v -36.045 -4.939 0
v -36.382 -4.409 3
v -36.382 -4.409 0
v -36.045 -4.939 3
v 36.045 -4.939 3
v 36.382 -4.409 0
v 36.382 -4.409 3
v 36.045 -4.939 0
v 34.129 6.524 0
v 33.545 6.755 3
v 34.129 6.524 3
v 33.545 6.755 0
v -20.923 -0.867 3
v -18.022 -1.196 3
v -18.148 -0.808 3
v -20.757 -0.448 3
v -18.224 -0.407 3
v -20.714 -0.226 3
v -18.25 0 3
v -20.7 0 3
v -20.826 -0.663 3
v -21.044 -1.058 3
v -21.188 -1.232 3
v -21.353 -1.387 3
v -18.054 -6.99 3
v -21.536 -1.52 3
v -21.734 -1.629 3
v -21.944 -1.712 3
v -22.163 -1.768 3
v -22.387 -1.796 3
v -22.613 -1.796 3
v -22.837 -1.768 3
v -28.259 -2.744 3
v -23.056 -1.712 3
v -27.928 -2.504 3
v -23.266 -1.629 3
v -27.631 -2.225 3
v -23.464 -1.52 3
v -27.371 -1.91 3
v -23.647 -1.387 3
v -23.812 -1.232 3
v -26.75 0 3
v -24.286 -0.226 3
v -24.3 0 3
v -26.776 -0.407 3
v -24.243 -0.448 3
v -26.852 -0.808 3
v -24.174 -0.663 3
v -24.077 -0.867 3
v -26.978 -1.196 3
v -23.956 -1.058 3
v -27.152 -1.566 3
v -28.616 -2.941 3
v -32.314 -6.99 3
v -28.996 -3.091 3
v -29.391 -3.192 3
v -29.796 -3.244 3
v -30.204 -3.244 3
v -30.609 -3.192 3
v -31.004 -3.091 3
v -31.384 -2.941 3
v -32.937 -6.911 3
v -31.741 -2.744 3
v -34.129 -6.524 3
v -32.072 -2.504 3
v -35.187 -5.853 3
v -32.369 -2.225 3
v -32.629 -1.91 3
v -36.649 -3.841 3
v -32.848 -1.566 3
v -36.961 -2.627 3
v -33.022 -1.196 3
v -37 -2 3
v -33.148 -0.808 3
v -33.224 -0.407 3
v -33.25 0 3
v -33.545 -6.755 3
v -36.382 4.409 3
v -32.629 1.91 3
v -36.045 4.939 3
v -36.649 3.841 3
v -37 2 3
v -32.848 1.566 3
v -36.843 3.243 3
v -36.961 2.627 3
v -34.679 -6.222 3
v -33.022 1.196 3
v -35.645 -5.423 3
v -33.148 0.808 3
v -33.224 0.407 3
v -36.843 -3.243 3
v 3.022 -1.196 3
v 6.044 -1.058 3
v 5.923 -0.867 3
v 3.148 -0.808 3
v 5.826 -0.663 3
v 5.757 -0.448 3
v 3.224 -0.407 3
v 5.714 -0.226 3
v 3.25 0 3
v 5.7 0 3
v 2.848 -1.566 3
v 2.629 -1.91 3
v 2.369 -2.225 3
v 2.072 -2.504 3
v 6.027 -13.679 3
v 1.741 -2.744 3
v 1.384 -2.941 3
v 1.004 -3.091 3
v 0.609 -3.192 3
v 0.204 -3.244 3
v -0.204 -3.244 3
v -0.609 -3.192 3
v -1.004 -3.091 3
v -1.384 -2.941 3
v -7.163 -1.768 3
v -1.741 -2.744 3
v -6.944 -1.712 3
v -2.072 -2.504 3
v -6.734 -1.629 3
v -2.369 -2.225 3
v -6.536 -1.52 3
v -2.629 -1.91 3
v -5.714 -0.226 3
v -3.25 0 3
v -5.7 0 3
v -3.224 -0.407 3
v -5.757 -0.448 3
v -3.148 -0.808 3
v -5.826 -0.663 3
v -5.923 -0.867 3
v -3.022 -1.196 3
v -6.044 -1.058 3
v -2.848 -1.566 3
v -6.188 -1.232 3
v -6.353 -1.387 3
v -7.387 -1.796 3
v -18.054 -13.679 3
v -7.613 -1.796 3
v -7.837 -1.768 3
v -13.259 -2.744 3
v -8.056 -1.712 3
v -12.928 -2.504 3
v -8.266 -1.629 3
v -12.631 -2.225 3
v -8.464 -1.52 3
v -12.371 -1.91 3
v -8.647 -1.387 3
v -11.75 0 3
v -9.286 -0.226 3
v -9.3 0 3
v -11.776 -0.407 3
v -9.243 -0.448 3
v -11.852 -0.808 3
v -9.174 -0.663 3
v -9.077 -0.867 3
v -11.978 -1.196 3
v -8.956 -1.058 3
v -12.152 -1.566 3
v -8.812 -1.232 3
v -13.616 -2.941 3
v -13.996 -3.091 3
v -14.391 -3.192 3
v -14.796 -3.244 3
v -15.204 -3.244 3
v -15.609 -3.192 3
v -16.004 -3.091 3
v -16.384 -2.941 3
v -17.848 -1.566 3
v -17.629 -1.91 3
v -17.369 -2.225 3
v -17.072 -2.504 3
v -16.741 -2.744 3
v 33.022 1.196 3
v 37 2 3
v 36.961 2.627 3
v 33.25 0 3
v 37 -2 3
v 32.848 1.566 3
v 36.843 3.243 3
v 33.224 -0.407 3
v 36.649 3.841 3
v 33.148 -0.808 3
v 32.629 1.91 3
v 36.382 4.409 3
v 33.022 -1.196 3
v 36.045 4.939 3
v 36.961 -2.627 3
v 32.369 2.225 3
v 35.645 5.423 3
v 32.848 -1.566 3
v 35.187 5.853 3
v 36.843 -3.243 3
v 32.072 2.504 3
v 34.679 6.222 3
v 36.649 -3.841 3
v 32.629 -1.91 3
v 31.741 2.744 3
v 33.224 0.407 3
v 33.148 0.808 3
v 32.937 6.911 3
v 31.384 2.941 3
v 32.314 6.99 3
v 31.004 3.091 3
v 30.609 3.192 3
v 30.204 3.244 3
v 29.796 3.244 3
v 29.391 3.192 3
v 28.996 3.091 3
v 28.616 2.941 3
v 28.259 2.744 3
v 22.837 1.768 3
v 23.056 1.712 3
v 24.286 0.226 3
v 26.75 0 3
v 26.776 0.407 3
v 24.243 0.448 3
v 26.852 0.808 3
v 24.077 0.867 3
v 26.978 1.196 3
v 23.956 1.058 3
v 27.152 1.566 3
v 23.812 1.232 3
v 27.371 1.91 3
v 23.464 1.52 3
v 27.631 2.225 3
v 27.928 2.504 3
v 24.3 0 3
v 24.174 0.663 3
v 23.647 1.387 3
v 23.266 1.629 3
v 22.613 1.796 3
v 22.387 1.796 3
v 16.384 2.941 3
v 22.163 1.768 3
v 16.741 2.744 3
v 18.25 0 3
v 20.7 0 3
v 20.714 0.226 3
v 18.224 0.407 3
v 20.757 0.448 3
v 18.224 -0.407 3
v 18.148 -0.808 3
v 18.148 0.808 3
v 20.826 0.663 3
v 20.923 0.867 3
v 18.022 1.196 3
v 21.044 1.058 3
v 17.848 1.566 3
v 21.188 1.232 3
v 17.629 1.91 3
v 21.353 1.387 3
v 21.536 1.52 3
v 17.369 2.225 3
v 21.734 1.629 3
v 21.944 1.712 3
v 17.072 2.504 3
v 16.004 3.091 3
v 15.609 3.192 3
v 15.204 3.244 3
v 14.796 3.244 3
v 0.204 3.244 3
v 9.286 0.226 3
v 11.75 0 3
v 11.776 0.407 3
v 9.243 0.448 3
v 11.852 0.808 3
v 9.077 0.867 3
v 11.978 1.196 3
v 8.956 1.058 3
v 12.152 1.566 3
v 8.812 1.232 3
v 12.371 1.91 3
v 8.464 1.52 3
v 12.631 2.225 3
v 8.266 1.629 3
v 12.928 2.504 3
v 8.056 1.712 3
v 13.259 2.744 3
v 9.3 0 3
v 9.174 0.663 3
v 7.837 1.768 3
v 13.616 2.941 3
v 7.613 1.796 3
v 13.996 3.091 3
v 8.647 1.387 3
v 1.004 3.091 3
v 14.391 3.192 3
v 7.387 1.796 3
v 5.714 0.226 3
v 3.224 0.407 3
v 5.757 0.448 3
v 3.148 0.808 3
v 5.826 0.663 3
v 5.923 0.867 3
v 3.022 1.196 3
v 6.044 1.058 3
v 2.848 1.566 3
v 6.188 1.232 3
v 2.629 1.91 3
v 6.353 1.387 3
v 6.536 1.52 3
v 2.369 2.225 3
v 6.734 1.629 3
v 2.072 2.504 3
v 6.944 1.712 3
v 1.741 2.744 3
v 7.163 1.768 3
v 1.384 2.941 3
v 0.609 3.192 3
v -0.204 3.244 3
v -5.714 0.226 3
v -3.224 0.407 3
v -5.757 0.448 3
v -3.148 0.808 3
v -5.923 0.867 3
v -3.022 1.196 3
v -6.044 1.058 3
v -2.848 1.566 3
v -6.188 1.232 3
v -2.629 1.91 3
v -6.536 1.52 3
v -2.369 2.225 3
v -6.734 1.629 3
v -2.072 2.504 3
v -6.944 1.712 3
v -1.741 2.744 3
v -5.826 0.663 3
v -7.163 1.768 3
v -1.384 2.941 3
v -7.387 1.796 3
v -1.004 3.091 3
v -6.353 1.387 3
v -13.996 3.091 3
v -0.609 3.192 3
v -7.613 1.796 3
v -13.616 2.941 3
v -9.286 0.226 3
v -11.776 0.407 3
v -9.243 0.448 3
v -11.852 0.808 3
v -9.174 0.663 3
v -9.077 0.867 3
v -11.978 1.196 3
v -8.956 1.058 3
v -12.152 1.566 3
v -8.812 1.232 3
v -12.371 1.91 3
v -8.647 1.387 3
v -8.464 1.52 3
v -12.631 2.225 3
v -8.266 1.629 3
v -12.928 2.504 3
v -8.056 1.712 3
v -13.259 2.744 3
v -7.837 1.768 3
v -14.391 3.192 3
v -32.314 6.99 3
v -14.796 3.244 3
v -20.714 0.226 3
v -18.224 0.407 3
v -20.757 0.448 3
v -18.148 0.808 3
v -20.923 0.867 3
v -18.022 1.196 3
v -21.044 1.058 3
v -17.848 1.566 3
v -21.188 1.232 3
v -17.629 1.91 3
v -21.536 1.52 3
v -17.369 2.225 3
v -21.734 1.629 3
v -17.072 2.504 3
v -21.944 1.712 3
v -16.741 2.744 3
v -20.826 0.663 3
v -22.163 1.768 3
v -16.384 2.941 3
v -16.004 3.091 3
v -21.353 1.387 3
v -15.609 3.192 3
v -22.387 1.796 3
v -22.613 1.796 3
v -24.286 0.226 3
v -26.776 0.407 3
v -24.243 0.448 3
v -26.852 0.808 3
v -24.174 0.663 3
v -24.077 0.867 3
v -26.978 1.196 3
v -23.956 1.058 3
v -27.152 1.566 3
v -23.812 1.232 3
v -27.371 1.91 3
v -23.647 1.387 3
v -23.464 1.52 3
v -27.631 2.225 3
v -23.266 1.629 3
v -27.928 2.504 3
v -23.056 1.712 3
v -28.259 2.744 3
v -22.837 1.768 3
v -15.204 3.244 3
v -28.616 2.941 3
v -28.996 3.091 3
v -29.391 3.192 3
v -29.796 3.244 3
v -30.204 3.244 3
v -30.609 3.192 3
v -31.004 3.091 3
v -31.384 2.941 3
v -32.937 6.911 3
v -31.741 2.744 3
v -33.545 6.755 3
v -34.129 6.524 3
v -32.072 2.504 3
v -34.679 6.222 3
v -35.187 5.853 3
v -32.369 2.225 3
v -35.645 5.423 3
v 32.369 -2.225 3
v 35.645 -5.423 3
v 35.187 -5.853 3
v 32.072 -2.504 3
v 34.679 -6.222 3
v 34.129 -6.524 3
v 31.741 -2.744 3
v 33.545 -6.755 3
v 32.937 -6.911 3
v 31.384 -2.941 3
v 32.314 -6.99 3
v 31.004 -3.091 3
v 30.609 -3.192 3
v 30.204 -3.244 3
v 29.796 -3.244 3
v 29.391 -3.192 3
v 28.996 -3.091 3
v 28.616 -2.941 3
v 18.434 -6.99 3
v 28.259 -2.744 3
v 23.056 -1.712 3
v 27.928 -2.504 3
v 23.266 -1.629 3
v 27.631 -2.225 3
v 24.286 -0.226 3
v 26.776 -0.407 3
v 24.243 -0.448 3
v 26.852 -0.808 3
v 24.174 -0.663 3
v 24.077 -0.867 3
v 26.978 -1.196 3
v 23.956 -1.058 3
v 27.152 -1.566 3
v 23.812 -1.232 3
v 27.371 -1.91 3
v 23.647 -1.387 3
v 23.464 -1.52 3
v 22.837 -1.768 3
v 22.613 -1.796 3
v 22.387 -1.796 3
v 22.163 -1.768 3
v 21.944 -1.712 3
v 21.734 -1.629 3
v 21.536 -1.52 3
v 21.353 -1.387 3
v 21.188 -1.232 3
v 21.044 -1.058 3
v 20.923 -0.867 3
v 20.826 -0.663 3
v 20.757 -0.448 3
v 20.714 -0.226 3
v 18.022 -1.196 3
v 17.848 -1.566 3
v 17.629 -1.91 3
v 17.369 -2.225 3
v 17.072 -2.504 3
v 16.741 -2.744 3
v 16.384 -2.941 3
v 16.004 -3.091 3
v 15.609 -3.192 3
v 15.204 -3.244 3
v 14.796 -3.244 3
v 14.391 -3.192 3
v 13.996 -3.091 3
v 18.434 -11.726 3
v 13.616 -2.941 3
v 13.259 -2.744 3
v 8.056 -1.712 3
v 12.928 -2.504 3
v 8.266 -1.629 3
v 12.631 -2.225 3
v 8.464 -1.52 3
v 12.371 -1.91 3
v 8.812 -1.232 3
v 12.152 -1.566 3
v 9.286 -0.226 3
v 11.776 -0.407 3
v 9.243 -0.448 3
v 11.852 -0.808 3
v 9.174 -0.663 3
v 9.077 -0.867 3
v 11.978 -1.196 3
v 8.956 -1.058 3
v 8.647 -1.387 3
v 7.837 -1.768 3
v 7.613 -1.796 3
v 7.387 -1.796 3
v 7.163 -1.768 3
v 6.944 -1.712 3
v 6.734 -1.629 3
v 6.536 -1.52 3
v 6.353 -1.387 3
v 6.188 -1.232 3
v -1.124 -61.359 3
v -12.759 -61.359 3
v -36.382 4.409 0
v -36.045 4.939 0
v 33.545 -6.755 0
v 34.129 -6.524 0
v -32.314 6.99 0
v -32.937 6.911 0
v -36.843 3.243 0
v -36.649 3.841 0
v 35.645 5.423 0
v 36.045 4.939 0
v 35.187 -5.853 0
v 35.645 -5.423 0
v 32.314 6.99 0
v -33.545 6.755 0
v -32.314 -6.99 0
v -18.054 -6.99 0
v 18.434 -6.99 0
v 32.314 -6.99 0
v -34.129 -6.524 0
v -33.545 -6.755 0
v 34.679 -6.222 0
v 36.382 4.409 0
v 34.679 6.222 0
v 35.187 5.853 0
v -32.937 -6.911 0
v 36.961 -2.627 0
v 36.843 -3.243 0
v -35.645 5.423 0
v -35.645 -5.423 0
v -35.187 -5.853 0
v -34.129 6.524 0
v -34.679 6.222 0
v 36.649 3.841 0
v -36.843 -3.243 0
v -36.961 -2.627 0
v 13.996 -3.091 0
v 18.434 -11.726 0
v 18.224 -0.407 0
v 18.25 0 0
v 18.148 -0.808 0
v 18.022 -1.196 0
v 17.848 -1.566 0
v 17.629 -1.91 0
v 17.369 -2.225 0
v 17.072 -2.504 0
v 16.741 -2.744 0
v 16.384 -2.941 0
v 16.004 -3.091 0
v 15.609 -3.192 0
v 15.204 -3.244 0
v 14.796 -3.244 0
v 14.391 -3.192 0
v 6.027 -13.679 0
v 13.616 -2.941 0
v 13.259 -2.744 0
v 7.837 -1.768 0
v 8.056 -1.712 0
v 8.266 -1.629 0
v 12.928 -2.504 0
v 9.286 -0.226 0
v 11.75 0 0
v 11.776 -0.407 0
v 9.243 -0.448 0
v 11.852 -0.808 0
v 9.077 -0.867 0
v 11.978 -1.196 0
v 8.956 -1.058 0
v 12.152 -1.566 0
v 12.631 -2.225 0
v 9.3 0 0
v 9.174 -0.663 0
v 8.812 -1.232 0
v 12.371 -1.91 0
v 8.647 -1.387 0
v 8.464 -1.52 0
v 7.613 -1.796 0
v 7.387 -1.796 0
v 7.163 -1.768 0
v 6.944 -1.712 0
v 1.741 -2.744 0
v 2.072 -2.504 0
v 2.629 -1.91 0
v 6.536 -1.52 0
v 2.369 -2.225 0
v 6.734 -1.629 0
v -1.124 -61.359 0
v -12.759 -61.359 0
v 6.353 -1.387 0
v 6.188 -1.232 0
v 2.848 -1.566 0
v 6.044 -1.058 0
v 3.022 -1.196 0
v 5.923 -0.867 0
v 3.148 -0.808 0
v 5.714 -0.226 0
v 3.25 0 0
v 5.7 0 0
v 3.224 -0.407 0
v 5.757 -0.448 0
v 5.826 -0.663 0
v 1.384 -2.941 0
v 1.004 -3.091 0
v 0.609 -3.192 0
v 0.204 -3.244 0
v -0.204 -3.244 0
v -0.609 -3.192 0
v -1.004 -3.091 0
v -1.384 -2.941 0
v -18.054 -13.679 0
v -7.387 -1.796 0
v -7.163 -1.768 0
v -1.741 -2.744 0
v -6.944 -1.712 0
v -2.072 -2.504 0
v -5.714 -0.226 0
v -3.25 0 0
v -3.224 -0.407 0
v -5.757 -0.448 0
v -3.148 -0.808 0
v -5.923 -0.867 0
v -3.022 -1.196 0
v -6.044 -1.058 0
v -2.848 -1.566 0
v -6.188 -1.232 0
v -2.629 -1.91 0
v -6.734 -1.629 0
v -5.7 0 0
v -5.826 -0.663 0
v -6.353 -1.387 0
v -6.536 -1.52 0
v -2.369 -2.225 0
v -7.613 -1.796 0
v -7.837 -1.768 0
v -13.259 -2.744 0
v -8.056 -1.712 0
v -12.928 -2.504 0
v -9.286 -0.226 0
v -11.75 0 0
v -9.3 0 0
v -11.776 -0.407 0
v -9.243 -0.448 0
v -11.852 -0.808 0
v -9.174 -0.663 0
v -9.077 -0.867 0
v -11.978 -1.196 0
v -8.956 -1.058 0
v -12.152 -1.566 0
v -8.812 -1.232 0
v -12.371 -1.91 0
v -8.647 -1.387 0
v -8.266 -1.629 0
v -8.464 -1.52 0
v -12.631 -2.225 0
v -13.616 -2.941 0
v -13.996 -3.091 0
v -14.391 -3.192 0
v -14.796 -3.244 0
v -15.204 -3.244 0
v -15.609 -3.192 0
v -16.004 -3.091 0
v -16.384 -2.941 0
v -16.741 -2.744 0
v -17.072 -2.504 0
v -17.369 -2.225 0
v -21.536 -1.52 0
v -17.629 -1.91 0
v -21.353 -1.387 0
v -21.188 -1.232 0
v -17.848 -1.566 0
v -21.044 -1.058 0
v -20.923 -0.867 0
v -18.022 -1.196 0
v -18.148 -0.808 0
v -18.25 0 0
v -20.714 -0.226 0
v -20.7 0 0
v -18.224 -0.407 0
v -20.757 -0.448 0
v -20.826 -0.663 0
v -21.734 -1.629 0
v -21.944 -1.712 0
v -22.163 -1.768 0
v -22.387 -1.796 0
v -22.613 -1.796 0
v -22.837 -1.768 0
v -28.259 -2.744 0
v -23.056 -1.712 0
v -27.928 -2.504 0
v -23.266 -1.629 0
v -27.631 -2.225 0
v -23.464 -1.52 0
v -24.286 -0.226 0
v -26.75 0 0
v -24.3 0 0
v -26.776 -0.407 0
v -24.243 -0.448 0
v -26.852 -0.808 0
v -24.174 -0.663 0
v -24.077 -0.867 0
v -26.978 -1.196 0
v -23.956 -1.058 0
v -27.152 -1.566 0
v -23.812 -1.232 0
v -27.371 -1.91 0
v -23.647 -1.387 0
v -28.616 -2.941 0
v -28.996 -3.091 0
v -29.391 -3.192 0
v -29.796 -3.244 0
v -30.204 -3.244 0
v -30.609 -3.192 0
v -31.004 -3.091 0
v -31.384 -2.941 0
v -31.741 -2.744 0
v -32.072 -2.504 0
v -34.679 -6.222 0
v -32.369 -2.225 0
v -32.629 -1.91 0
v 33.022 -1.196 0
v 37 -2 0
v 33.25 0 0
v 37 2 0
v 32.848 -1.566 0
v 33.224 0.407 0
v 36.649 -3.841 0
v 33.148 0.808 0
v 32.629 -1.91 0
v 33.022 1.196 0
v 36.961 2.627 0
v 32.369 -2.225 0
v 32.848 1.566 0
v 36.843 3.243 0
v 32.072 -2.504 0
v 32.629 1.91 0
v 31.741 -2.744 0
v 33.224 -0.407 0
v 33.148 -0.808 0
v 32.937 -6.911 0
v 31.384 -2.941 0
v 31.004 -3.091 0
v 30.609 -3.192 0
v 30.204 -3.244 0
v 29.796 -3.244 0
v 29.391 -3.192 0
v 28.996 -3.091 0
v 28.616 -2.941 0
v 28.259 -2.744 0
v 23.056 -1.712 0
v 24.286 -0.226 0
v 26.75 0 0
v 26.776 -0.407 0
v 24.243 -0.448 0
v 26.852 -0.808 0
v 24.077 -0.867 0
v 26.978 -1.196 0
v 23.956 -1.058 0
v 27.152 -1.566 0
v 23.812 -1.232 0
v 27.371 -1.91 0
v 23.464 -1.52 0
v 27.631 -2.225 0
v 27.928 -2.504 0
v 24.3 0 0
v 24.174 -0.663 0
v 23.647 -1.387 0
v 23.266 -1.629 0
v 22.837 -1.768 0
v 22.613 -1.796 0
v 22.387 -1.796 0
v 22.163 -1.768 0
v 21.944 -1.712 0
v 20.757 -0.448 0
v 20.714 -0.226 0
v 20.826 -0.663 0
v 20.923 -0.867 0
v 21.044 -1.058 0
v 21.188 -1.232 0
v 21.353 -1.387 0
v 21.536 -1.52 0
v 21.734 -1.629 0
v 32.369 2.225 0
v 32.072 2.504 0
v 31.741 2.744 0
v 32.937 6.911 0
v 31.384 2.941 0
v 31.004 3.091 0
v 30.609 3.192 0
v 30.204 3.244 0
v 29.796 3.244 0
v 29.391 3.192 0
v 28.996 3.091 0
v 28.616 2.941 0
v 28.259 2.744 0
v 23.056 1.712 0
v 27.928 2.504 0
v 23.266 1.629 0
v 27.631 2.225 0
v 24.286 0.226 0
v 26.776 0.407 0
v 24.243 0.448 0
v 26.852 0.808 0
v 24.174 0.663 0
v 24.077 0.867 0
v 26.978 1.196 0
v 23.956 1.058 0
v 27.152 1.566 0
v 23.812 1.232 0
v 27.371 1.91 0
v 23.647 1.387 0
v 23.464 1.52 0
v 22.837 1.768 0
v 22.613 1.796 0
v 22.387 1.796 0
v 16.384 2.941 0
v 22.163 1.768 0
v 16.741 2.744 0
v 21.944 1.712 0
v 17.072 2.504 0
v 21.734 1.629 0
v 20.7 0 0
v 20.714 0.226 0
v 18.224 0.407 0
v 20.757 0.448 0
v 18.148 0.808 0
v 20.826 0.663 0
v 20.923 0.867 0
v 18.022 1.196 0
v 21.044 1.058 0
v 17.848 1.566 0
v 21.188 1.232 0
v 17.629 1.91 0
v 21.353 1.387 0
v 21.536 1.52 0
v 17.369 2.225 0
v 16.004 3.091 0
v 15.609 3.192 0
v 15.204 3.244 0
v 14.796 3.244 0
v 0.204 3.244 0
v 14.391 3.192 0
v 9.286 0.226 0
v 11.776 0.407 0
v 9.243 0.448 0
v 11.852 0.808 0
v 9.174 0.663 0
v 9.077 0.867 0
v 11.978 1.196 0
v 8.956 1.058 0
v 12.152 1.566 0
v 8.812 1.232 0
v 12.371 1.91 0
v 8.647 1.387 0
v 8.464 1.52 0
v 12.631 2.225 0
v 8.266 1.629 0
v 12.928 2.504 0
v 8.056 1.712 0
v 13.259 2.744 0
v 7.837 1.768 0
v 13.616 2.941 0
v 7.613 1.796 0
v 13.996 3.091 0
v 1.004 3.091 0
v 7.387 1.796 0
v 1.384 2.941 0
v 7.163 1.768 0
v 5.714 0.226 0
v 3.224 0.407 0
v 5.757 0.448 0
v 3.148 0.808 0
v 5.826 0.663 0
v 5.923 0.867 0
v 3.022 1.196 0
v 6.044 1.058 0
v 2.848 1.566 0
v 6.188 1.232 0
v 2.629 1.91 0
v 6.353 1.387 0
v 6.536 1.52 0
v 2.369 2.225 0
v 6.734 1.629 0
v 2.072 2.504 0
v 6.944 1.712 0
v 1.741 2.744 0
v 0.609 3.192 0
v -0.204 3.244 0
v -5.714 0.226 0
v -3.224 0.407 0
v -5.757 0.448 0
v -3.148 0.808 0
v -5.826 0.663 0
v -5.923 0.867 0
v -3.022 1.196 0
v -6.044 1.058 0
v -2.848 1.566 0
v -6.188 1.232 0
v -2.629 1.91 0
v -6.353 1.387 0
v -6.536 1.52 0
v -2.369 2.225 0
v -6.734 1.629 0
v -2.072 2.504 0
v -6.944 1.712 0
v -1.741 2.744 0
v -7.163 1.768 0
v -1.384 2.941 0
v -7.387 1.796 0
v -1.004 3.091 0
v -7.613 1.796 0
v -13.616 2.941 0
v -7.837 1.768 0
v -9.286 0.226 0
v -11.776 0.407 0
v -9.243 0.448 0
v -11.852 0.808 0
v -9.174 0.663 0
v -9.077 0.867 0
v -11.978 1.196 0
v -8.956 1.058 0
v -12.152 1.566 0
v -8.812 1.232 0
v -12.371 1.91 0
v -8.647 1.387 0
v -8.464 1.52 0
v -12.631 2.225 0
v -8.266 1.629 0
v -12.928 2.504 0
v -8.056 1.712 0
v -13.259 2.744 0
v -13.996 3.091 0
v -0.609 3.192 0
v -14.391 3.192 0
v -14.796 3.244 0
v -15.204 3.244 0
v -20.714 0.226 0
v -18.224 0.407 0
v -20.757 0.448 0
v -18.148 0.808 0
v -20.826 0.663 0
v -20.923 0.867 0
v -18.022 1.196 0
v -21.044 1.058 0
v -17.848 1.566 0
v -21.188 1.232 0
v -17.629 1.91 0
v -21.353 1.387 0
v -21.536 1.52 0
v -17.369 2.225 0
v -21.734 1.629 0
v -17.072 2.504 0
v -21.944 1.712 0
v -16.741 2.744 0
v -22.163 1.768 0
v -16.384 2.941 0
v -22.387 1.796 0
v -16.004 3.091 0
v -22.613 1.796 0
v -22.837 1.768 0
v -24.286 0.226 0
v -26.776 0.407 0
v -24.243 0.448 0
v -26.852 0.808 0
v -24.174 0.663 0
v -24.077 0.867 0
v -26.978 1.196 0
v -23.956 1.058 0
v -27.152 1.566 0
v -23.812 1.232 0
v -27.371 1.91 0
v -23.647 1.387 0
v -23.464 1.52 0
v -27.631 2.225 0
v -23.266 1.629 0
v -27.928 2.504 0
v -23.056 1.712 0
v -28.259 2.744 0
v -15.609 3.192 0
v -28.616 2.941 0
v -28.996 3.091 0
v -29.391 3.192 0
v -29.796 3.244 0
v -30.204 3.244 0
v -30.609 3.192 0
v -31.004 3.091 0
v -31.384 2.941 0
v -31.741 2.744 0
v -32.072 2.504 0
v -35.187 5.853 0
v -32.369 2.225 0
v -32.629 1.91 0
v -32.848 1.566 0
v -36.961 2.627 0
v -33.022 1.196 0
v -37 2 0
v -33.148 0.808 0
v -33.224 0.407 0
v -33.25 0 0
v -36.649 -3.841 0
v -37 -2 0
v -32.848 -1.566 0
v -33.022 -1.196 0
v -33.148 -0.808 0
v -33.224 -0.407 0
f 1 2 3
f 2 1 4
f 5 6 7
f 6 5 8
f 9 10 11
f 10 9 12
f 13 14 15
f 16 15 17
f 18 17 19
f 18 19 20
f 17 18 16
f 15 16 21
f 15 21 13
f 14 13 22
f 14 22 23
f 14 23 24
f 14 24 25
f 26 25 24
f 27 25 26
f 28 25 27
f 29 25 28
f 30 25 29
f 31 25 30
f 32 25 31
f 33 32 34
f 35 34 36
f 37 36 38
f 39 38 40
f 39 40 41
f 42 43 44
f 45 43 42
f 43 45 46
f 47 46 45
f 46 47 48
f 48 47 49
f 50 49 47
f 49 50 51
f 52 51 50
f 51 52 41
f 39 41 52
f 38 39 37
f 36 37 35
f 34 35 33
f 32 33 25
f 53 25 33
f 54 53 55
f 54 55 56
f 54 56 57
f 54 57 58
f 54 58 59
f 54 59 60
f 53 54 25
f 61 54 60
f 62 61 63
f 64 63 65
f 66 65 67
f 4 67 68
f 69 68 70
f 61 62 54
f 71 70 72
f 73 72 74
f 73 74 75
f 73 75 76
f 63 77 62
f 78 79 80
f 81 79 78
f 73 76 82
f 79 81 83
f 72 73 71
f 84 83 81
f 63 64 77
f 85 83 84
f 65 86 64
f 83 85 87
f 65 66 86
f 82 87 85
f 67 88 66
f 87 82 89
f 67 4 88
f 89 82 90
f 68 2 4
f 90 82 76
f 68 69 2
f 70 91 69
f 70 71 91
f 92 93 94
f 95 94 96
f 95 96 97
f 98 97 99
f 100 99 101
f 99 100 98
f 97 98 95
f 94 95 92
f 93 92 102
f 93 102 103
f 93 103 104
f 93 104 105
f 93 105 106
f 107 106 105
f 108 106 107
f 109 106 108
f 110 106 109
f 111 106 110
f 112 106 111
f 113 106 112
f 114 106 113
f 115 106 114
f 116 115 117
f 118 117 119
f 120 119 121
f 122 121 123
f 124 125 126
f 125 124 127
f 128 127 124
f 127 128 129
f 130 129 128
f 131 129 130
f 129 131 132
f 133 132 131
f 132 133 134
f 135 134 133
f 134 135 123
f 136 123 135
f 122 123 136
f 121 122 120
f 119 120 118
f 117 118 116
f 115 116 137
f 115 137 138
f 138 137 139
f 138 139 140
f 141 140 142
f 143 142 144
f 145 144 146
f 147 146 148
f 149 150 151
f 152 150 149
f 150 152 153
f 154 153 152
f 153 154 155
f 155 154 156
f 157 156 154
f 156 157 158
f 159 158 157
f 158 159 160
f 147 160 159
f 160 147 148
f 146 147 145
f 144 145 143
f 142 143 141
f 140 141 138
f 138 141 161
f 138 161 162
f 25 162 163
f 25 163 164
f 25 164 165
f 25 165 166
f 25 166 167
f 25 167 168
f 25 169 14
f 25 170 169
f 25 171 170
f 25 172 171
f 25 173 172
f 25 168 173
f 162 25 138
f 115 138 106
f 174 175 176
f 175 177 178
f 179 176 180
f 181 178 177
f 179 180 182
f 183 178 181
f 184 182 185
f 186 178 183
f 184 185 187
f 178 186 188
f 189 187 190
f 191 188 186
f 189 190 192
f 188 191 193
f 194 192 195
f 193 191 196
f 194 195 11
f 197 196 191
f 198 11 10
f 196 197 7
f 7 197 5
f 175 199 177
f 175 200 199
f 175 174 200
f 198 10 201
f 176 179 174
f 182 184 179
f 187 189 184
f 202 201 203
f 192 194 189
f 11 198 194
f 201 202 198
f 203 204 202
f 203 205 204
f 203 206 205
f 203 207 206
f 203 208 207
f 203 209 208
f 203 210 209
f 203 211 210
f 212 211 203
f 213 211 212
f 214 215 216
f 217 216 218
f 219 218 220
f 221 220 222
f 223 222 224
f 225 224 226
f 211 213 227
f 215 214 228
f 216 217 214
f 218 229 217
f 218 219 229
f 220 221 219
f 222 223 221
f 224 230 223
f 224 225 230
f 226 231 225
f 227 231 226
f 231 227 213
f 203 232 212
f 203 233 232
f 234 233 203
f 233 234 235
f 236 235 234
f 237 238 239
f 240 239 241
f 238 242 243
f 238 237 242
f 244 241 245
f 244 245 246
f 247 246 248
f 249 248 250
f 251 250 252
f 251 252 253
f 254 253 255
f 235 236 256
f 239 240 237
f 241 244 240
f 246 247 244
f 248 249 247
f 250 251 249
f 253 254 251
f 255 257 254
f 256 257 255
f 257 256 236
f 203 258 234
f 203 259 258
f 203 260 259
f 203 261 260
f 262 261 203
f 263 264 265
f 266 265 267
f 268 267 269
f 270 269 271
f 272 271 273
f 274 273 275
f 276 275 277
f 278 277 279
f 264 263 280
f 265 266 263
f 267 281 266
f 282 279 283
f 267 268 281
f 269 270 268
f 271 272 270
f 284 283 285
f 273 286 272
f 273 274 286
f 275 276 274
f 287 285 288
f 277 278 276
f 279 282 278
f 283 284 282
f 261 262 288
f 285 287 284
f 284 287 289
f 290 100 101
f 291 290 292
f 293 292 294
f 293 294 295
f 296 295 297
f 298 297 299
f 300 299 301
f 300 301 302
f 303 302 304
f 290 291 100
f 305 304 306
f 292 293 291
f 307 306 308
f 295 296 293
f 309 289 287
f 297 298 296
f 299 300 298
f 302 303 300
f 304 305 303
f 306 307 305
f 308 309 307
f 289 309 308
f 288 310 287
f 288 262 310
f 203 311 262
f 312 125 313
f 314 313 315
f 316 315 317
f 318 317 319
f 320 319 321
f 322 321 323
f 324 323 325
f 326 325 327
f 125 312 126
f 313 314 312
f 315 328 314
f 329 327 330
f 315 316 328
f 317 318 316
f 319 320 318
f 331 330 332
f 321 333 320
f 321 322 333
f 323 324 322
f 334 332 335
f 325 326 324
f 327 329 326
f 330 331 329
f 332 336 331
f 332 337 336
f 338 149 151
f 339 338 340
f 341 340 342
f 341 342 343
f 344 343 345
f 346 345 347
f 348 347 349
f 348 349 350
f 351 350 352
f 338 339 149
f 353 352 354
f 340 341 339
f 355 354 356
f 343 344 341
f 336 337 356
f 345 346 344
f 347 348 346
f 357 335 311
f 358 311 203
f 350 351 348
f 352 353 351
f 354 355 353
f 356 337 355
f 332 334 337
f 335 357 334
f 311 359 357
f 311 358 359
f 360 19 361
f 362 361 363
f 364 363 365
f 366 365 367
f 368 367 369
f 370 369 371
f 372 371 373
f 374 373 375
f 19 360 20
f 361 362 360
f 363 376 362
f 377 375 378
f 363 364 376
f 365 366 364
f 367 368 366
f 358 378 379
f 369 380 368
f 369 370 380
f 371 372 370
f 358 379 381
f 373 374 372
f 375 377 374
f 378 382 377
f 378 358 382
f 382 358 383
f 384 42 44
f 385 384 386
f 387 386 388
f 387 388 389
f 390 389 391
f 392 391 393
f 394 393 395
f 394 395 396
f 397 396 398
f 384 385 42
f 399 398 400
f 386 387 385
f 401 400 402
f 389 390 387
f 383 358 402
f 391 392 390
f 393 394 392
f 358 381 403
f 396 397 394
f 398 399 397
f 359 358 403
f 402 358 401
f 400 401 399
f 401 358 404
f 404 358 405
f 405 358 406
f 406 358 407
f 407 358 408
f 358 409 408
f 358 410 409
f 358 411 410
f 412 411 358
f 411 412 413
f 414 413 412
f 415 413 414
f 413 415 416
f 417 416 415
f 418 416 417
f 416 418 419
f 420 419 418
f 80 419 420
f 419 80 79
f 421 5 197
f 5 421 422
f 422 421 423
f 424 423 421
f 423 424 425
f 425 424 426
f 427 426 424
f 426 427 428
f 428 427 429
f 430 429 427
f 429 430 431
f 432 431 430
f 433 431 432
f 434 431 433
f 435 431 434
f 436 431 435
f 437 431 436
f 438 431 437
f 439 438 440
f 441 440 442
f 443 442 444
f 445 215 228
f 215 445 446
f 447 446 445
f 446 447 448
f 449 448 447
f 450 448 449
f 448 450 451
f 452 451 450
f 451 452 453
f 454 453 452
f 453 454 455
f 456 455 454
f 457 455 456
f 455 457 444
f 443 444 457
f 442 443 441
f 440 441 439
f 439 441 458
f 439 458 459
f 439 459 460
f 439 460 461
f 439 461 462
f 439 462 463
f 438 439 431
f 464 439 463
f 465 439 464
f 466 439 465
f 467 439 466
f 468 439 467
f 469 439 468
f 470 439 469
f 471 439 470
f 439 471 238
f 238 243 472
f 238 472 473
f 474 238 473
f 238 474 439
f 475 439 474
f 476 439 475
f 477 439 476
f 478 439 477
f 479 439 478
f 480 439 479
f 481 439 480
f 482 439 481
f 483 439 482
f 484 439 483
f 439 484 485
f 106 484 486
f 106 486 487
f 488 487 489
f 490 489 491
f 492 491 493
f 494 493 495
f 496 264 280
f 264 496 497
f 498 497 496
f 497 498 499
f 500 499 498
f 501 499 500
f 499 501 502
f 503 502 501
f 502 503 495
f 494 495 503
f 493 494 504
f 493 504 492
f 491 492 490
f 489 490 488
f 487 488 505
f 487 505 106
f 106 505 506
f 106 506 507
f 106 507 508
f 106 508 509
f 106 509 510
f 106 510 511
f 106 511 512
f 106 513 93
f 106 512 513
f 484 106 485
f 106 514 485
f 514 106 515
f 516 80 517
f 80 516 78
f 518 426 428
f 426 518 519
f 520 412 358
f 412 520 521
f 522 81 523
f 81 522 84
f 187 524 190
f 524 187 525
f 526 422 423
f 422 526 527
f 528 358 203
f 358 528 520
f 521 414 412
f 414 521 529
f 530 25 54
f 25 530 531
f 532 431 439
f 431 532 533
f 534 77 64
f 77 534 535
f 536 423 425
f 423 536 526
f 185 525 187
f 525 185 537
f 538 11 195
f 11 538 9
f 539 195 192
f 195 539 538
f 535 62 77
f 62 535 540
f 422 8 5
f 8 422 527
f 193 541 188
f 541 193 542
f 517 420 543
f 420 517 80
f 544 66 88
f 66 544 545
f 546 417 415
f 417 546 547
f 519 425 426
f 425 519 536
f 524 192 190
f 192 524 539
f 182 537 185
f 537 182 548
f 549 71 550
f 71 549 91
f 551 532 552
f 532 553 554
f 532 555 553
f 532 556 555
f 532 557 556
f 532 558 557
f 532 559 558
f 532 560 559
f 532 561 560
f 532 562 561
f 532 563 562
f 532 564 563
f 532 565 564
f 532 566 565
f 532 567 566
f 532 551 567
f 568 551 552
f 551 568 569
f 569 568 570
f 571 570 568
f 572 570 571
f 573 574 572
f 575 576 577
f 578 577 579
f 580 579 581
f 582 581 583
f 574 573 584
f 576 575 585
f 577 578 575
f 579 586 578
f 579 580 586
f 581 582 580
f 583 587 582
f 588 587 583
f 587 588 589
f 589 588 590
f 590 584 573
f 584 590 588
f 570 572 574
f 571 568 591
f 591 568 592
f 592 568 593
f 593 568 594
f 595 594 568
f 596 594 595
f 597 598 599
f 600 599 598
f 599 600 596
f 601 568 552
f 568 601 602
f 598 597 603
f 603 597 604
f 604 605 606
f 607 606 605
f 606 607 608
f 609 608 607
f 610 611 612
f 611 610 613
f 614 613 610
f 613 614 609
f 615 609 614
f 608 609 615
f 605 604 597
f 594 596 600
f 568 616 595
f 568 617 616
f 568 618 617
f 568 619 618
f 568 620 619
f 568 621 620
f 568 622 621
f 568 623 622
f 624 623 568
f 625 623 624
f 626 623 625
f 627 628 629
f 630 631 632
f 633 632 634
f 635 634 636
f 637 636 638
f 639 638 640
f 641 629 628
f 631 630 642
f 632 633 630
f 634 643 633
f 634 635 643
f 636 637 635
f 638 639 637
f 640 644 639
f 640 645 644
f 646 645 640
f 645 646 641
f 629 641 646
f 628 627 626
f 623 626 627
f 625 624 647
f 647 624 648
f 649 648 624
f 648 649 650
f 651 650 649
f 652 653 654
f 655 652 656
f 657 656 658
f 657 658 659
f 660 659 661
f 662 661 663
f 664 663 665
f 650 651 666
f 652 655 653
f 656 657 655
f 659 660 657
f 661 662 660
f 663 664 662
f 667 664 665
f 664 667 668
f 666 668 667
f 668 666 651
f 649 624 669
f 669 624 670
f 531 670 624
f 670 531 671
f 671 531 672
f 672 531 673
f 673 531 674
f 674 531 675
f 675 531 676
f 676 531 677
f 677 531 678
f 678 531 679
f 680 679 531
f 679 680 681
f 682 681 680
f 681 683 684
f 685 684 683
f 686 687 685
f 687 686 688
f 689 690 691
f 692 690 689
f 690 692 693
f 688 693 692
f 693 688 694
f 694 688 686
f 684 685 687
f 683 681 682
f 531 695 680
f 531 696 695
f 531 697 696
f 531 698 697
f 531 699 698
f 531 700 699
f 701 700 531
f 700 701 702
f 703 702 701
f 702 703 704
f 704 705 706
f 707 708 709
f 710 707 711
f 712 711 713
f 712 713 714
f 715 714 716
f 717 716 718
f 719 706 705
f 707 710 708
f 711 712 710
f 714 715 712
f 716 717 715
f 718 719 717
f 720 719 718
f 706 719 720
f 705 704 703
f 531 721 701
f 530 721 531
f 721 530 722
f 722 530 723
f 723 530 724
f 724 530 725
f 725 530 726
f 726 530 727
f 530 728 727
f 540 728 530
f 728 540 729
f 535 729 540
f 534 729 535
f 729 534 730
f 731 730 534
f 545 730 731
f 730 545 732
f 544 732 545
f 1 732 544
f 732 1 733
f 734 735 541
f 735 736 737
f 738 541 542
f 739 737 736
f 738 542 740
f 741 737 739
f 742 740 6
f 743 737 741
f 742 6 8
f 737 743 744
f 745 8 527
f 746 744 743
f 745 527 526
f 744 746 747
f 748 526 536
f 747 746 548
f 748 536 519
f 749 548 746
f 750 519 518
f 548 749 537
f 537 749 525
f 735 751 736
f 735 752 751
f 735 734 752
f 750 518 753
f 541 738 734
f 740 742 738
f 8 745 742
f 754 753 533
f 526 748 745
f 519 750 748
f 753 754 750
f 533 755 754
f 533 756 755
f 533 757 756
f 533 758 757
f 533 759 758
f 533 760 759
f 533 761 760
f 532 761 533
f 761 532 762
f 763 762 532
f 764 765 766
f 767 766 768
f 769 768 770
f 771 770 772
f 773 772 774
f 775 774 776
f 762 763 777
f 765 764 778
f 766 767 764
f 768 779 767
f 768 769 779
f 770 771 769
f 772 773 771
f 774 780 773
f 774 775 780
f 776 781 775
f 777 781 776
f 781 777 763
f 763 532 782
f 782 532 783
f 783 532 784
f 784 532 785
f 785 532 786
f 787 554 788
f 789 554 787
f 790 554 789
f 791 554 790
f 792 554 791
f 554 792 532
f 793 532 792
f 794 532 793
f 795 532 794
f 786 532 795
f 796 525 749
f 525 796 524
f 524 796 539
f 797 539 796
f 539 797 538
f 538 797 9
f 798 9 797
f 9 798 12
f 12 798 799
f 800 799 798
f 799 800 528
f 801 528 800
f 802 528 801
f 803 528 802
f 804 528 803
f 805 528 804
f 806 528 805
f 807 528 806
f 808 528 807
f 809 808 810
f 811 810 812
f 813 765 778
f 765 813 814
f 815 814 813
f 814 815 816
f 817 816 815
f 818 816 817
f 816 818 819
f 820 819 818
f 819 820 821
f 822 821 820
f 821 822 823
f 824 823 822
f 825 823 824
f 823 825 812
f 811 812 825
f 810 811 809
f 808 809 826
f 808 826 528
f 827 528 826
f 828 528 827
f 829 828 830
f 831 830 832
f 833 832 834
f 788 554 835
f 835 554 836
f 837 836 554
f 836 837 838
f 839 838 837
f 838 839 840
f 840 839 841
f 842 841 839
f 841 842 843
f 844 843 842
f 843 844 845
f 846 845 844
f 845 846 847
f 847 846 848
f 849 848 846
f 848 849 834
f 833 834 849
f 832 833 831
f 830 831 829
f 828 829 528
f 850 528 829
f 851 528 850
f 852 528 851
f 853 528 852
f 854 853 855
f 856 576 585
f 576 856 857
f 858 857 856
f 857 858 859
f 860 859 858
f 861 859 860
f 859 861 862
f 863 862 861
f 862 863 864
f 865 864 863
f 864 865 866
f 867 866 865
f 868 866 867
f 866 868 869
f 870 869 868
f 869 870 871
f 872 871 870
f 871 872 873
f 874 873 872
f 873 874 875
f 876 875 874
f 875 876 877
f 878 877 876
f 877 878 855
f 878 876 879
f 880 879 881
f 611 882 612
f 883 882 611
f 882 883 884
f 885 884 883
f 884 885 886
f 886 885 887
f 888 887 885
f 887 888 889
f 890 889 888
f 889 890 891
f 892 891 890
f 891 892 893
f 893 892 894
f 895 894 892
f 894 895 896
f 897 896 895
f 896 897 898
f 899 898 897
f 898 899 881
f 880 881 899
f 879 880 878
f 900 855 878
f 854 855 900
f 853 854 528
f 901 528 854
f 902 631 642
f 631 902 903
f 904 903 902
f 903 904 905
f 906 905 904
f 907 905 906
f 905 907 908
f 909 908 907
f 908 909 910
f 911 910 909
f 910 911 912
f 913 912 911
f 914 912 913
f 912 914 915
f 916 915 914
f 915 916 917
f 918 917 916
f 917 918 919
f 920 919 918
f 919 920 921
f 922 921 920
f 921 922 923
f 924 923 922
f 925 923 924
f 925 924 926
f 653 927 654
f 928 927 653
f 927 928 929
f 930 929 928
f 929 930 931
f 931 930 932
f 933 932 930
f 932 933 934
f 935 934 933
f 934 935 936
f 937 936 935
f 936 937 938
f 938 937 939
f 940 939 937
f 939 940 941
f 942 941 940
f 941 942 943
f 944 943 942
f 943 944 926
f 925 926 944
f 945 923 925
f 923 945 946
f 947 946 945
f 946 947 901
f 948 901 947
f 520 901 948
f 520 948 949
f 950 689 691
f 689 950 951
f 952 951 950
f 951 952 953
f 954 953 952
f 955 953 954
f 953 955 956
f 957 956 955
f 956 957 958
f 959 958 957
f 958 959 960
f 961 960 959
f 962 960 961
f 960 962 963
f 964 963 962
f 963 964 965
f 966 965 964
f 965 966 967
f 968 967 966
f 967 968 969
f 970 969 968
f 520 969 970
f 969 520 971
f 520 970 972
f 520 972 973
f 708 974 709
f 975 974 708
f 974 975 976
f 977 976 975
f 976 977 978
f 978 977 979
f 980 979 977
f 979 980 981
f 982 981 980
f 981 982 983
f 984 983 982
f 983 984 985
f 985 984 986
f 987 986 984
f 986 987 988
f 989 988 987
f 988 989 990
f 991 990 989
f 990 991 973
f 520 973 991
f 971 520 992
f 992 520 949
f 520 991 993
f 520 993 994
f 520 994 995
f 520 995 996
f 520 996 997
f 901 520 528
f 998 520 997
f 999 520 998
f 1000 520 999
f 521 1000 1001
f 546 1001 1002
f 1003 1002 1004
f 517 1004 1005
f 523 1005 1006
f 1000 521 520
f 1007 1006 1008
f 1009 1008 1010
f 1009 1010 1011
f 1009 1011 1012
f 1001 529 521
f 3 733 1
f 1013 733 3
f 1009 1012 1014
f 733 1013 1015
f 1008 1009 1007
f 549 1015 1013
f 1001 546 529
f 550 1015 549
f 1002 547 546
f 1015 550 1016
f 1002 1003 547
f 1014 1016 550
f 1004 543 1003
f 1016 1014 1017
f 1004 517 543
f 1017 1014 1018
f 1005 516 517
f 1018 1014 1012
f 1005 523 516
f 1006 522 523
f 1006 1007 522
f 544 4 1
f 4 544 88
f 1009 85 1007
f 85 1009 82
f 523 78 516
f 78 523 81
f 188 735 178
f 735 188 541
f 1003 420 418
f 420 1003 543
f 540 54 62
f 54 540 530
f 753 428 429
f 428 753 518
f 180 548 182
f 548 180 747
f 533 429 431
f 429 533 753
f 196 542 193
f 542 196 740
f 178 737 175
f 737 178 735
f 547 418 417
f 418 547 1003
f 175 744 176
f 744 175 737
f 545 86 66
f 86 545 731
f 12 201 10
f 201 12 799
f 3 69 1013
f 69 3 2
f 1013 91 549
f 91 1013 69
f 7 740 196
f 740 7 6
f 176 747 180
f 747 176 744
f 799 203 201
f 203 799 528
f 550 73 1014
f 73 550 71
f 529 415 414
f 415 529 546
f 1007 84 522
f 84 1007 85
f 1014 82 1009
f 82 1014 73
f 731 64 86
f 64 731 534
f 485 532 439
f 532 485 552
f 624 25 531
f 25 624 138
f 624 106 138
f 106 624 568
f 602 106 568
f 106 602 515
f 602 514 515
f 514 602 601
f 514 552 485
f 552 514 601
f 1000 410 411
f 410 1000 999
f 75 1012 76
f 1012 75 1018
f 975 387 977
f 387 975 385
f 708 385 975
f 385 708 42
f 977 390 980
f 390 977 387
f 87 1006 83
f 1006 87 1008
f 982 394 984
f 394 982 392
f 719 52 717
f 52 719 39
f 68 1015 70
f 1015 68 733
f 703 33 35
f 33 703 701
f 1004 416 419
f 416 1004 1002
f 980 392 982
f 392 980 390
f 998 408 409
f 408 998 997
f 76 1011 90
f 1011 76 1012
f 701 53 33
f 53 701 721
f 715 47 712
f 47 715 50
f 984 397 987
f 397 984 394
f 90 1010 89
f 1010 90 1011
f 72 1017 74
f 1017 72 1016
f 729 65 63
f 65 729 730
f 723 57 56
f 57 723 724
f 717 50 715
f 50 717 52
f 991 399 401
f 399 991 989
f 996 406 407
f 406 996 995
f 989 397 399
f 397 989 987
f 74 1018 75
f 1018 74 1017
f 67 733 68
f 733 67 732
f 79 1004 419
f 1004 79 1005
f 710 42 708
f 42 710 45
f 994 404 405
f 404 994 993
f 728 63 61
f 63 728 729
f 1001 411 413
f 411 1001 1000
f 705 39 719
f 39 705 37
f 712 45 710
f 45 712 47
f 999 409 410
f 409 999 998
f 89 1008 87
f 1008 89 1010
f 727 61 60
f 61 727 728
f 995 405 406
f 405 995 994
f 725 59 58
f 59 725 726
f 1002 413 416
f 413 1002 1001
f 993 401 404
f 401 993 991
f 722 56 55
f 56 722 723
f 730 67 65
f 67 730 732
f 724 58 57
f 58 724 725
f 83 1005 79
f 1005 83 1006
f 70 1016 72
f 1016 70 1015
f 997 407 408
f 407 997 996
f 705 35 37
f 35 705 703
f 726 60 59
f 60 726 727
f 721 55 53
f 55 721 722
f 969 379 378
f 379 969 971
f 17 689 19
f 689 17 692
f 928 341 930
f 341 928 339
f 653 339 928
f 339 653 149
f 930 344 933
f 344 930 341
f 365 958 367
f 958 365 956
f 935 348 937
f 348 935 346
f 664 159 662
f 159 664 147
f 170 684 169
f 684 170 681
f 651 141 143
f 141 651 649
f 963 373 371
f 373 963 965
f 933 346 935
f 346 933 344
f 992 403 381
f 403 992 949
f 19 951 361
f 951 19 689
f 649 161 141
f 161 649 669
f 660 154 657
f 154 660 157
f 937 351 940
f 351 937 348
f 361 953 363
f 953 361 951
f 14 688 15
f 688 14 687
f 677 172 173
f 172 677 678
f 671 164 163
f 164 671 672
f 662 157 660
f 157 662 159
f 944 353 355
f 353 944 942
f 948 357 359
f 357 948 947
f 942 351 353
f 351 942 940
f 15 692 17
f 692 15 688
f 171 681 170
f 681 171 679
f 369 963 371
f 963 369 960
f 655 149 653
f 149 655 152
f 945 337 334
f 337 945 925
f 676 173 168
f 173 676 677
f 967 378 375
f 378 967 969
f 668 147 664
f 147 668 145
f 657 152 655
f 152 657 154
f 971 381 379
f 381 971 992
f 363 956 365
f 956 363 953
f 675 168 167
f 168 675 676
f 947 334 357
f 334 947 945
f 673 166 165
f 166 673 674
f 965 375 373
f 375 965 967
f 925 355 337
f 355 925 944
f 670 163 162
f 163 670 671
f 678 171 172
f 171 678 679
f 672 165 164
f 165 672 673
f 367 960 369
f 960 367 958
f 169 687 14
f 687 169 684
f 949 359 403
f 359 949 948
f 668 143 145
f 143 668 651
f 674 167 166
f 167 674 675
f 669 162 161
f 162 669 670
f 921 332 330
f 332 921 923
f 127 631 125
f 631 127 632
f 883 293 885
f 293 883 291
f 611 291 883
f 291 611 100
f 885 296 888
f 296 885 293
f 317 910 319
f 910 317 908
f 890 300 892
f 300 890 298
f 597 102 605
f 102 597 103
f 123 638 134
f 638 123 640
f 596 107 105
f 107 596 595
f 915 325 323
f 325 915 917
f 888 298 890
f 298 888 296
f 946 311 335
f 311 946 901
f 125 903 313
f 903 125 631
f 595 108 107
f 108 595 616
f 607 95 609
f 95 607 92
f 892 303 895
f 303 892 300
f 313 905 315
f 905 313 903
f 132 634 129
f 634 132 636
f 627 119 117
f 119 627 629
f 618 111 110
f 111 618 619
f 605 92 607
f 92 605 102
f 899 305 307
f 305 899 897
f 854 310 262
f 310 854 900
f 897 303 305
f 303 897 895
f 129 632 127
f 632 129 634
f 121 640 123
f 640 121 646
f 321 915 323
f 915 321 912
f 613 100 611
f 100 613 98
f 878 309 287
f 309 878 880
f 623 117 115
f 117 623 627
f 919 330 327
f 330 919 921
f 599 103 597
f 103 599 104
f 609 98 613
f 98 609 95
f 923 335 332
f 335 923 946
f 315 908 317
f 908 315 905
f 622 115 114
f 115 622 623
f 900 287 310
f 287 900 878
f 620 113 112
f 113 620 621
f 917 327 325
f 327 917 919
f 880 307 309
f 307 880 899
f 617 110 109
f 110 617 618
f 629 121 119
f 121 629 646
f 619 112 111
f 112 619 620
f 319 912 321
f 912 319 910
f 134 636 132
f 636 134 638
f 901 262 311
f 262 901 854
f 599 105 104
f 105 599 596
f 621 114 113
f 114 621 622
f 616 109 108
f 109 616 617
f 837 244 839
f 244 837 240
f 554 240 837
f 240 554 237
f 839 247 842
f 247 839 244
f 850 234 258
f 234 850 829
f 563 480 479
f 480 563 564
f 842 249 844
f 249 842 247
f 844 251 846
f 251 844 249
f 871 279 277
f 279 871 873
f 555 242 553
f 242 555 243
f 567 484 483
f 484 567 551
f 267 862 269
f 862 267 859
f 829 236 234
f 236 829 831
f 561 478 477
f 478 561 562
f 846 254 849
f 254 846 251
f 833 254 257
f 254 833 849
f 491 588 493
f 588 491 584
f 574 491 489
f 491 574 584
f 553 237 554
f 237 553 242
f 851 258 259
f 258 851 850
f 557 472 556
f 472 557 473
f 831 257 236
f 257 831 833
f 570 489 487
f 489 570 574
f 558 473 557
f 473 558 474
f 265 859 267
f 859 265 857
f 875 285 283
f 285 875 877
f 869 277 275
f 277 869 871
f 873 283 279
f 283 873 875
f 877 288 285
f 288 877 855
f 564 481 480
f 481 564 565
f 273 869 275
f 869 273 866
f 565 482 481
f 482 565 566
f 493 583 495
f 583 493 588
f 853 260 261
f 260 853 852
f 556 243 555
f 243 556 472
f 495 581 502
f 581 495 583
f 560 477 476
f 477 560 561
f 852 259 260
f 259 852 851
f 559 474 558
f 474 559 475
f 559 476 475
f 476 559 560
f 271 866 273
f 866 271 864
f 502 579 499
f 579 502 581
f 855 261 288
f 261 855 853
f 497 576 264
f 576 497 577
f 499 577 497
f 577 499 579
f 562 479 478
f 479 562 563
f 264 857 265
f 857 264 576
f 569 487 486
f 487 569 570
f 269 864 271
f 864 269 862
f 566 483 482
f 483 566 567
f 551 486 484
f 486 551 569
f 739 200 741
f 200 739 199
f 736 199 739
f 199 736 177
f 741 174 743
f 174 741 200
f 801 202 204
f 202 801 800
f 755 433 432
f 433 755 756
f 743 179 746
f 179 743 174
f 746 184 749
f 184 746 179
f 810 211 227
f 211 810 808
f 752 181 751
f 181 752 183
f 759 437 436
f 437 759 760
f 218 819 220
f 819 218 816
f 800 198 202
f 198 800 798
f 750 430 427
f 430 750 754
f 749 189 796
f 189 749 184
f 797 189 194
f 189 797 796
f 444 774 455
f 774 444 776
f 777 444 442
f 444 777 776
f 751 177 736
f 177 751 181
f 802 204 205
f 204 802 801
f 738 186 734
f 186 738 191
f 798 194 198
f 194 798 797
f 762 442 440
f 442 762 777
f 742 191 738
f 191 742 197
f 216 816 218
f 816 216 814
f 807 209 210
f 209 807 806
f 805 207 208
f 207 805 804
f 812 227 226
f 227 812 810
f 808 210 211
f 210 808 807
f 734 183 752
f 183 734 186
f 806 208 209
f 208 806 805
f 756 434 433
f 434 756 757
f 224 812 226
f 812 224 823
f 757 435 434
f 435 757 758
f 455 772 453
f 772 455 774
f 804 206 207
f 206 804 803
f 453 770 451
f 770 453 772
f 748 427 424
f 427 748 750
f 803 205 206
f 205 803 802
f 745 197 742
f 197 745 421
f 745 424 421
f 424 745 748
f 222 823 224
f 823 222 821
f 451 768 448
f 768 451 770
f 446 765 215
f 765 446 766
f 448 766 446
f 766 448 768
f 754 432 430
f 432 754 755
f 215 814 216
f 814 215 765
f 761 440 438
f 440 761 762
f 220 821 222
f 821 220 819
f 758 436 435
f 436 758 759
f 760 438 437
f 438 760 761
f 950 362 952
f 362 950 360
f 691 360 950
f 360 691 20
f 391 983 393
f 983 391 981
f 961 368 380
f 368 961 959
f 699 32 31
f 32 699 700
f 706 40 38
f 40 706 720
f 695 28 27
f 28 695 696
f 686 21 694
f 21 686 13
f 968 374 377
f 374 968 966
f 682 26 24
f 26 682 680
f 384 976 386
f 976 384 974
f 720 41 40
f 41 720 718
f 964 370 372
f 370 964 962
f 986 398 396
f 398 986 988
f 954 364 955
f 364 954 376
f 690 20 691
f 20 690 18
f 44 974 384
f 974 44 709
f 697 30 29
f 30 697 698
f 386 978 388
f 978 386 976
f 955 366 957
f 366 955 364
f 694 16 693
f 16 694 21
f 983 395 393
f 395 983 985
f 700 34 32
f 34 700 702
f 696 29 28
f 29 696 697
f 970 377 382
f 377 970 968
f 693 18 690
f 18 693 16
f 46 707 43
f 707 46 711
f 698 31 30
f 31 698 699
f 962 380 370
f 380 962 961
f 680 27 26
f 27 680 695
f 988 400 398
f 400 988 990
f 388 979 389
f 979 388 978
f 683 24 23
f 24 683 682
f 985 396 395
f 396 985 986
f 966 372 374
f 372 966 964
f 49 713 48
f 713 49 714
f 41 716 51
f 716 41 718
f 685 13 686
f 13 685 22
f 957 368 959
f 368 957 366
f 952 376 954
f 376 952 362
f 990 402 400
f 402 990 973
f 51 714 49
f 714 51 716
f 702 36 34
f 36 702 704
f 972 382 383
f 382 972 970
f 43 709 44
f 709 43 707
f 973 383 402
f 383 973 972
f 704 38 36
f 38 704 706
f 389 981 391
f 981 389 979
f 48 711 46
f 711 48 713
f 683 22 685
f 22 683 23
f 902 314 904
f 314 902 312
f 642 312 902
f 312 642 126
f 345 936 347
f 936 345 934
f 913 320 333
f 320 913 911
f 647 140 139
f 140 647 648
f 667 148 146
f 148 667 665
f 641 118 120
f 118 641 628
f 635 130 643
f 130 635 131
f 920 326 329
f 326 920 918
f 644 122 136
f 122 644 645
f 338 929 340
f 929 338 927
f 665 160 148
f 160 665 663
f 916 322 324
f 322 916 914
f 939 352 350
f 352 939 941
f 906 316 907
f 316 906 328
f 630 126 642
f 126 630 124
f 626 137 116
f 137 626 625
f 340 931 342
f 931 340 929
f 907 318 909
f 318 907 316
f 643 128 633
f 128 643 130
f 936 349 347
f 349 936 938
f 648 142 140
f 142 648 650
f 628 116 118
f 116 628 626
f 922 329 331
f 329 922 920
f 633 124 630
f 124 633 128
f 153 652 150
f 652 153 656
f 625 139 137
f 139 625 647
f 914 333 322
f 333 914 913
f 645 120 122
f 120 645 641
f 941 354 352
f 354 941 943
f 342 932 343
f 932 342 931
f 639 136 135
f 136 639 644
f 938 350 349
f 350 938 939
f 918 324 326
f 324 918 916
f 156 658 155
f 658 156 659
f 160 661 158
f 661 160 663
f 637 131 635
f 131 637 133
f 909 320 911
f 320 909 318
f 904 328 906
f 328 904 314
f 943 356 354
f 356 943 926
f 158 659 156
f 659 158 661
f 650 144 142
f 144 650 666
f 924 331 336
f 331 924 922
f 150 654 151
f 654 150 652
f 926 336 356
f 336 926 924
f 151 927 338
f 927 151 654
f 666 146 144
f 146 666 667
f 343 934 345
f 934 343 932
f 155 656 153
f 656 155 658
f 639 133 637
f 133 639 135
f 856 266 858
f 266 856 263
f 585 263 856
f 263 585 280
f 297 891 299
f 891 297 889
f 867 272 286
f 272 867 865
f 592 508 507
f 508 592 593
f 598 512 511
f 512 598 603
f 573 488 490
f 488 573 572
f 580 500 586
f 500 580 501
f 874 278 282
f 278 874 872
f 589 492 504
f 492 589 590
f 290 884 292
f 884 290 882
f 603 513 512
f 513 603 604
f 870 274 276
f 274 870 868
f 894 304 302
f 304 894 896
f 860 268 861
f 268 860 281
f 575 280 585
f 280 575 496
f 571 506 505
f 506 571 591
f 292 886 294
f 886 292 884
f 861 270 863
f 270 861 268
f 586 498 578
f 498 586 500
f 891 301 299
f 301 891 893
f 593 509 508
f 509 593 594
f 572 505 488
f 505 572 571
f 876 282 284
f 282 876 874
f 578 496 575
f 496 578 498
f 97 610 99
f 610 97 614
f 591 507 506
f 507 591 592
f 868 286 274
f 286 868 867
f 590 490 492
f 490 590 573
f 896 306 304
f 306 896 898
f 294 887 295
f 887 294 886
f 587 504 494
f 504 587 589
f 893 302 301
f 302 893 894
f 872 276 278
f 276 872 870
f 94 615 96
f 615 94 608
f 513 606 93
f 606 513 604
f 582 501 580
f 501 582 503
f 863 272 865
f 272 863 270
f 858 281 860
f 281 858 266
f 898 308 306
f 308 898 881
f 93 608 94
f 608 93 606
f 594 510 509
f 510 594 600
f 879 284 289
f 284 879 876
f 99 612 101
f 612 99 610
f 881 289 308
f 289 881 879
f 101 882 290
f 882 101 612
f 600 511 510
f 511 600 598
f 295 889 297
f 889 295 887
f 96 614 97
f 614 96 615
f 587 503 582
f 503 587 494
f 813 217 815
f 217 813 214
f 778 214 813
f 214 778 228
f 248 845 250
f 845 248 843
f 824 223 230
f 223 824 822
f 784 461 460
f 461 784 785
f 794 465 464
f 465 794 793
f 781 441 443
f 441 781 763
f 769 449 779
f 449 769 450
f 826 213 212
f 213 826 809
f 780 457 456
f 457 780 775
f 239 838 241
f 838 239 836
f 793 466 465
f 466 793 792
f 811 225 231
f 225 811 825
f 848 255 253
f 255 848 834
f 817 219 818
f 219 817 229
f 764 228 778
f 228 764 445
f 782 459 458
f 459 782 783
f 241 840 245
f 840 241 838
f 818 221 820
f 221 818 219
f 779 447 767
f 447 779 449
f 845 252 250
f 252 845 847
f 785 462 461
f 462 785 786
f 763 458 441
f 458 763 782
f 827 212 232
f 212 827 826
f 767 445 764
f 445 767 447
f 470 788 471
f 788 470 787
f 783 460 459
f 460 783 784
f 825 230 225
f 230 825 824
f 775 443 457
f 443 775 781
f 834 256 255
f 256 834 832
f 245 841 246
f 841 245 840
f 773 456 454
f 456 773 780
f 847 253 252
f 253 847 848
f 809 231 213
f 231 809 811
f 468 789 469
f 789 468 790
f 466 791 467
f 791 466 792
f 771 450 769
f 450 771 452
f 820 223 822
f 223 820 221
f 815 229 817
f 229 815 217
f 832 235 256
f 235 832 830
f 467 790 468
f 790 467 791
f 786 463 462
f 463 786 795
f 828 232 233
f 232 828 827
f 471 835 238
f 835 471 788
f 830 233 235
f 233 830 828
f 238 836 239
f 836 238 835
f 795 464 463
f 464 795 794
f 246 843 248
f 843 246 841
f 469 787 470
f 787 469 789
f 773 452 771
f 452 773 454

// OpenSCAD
$fn = 50;


difference() {
	union() {
		hull() {
			translate(v = [-32.0000000000, 2.0000000000, 0]) {
				cylinder(h = 3, r = 5);
			}
			translate(v = [32.0000000000, 2.0000000000, 0]) {
				cylinder(h = 3, r = 5);
			}
			translate(v = [-32.0000000000, -2.0000000000, 0]) {
				cylinder(h = 3, r = 5);
			}
			translate(v = [32.0000000000, -2.0000000000, 0]) {
				cylinder(h = 3, r = 5);
			}
		}
		translate(v = [0, -5, 0]) {
			linear_extrude(height = 3) {
				text(font = "DejaVu Sans Mono:style=Bold", halign = "center", size = 57.0000000000, text = "7", valign = "top");
			}
		}
	}
	union() {
		translate(v = [-30.0000000000, 0.0000000000, 0]) {
			translate(v = [0, 0, -100]) {
				cylinder(h = 200, r = 3.2500000000);
			}
		}
		translate(v = [-15.0000000000, 0.0000000000, 0]) {
			translate(v = [0, 0, -100]) {
				cylinder(h = 200, r = 3.2500000000);
			}
		}
		translate(v = [0, 0, -100]) {
			cylinder(h = 200, r = 3.2500000000);
		}
		translate(v = [15.0000000000, 0.0000000000, 0]) {
			translate(v = [0, 0, -100]) {
				cylinder(h = 200, r = 3.2500000000);
			}
		}
		translate(v = [30.0000000000, 0.0000000000, 0]) {
			translate(v = [0, 0, -100]) {
				cylinder(h = 200, r = 3.2500000000);
			}
		}
		translate(v = [-30.0000000000, 0.0000000000, 0]) {
			translate(v = [0, 0, -100]) {
				cylinder(h = 200, r = 1.8000000000);
			}
		}
		translate(v = [-22.5000000000, 0.0000000000, 0]) {
			translate(v = [0, 0, -100]) {
				cylinder(h = 200, r = 1.8000000000);
			}
		}
		translate(v = [-15.0000000000, 0.0000000000, 0]) {
			translate(v = [0, 0, -100]) {
				cylinder(h = 200, r = 1.8000000000);
			}
		}
		translate(v = [-7.5000000000, 0.0000000000, 0]) {
			translate(v = [0, 0, -100]) {
				cylinder(h = 200, r = 1.8000000000);
			}
		}
		translate(v = [0, 0, -100]) {
			cylinder(h = 200, r = 1.8000000000);
		}
		translate(v = [7.5000000000, 0.0000000000, 0]) {
			translate(v = [0, 0, -100]) {
				cylinder(h = 200, r = 1.8000000000);
			}
		}
		translate(v = [15.0000000000, 0.0000000000, 0]) {
			translate(v = [0, 0, -100]) {
				cylinder(h = 200, r = 1.8000000000);
			}
		}
		translate(v = [22.5000000000, 0.0000000000, 0]) {
			translate(v = [0, 0, -100]) {
				cylinder(h = 200, r = 1.8000000000);
			}
		}
		translate(v = [30.0000000000, 0.0000000000, 0]) {
			translate(v = [0, 0, -100]) {
				cylinder(h = 200, r = 1.8000000000);
			}
		}
	}
}
